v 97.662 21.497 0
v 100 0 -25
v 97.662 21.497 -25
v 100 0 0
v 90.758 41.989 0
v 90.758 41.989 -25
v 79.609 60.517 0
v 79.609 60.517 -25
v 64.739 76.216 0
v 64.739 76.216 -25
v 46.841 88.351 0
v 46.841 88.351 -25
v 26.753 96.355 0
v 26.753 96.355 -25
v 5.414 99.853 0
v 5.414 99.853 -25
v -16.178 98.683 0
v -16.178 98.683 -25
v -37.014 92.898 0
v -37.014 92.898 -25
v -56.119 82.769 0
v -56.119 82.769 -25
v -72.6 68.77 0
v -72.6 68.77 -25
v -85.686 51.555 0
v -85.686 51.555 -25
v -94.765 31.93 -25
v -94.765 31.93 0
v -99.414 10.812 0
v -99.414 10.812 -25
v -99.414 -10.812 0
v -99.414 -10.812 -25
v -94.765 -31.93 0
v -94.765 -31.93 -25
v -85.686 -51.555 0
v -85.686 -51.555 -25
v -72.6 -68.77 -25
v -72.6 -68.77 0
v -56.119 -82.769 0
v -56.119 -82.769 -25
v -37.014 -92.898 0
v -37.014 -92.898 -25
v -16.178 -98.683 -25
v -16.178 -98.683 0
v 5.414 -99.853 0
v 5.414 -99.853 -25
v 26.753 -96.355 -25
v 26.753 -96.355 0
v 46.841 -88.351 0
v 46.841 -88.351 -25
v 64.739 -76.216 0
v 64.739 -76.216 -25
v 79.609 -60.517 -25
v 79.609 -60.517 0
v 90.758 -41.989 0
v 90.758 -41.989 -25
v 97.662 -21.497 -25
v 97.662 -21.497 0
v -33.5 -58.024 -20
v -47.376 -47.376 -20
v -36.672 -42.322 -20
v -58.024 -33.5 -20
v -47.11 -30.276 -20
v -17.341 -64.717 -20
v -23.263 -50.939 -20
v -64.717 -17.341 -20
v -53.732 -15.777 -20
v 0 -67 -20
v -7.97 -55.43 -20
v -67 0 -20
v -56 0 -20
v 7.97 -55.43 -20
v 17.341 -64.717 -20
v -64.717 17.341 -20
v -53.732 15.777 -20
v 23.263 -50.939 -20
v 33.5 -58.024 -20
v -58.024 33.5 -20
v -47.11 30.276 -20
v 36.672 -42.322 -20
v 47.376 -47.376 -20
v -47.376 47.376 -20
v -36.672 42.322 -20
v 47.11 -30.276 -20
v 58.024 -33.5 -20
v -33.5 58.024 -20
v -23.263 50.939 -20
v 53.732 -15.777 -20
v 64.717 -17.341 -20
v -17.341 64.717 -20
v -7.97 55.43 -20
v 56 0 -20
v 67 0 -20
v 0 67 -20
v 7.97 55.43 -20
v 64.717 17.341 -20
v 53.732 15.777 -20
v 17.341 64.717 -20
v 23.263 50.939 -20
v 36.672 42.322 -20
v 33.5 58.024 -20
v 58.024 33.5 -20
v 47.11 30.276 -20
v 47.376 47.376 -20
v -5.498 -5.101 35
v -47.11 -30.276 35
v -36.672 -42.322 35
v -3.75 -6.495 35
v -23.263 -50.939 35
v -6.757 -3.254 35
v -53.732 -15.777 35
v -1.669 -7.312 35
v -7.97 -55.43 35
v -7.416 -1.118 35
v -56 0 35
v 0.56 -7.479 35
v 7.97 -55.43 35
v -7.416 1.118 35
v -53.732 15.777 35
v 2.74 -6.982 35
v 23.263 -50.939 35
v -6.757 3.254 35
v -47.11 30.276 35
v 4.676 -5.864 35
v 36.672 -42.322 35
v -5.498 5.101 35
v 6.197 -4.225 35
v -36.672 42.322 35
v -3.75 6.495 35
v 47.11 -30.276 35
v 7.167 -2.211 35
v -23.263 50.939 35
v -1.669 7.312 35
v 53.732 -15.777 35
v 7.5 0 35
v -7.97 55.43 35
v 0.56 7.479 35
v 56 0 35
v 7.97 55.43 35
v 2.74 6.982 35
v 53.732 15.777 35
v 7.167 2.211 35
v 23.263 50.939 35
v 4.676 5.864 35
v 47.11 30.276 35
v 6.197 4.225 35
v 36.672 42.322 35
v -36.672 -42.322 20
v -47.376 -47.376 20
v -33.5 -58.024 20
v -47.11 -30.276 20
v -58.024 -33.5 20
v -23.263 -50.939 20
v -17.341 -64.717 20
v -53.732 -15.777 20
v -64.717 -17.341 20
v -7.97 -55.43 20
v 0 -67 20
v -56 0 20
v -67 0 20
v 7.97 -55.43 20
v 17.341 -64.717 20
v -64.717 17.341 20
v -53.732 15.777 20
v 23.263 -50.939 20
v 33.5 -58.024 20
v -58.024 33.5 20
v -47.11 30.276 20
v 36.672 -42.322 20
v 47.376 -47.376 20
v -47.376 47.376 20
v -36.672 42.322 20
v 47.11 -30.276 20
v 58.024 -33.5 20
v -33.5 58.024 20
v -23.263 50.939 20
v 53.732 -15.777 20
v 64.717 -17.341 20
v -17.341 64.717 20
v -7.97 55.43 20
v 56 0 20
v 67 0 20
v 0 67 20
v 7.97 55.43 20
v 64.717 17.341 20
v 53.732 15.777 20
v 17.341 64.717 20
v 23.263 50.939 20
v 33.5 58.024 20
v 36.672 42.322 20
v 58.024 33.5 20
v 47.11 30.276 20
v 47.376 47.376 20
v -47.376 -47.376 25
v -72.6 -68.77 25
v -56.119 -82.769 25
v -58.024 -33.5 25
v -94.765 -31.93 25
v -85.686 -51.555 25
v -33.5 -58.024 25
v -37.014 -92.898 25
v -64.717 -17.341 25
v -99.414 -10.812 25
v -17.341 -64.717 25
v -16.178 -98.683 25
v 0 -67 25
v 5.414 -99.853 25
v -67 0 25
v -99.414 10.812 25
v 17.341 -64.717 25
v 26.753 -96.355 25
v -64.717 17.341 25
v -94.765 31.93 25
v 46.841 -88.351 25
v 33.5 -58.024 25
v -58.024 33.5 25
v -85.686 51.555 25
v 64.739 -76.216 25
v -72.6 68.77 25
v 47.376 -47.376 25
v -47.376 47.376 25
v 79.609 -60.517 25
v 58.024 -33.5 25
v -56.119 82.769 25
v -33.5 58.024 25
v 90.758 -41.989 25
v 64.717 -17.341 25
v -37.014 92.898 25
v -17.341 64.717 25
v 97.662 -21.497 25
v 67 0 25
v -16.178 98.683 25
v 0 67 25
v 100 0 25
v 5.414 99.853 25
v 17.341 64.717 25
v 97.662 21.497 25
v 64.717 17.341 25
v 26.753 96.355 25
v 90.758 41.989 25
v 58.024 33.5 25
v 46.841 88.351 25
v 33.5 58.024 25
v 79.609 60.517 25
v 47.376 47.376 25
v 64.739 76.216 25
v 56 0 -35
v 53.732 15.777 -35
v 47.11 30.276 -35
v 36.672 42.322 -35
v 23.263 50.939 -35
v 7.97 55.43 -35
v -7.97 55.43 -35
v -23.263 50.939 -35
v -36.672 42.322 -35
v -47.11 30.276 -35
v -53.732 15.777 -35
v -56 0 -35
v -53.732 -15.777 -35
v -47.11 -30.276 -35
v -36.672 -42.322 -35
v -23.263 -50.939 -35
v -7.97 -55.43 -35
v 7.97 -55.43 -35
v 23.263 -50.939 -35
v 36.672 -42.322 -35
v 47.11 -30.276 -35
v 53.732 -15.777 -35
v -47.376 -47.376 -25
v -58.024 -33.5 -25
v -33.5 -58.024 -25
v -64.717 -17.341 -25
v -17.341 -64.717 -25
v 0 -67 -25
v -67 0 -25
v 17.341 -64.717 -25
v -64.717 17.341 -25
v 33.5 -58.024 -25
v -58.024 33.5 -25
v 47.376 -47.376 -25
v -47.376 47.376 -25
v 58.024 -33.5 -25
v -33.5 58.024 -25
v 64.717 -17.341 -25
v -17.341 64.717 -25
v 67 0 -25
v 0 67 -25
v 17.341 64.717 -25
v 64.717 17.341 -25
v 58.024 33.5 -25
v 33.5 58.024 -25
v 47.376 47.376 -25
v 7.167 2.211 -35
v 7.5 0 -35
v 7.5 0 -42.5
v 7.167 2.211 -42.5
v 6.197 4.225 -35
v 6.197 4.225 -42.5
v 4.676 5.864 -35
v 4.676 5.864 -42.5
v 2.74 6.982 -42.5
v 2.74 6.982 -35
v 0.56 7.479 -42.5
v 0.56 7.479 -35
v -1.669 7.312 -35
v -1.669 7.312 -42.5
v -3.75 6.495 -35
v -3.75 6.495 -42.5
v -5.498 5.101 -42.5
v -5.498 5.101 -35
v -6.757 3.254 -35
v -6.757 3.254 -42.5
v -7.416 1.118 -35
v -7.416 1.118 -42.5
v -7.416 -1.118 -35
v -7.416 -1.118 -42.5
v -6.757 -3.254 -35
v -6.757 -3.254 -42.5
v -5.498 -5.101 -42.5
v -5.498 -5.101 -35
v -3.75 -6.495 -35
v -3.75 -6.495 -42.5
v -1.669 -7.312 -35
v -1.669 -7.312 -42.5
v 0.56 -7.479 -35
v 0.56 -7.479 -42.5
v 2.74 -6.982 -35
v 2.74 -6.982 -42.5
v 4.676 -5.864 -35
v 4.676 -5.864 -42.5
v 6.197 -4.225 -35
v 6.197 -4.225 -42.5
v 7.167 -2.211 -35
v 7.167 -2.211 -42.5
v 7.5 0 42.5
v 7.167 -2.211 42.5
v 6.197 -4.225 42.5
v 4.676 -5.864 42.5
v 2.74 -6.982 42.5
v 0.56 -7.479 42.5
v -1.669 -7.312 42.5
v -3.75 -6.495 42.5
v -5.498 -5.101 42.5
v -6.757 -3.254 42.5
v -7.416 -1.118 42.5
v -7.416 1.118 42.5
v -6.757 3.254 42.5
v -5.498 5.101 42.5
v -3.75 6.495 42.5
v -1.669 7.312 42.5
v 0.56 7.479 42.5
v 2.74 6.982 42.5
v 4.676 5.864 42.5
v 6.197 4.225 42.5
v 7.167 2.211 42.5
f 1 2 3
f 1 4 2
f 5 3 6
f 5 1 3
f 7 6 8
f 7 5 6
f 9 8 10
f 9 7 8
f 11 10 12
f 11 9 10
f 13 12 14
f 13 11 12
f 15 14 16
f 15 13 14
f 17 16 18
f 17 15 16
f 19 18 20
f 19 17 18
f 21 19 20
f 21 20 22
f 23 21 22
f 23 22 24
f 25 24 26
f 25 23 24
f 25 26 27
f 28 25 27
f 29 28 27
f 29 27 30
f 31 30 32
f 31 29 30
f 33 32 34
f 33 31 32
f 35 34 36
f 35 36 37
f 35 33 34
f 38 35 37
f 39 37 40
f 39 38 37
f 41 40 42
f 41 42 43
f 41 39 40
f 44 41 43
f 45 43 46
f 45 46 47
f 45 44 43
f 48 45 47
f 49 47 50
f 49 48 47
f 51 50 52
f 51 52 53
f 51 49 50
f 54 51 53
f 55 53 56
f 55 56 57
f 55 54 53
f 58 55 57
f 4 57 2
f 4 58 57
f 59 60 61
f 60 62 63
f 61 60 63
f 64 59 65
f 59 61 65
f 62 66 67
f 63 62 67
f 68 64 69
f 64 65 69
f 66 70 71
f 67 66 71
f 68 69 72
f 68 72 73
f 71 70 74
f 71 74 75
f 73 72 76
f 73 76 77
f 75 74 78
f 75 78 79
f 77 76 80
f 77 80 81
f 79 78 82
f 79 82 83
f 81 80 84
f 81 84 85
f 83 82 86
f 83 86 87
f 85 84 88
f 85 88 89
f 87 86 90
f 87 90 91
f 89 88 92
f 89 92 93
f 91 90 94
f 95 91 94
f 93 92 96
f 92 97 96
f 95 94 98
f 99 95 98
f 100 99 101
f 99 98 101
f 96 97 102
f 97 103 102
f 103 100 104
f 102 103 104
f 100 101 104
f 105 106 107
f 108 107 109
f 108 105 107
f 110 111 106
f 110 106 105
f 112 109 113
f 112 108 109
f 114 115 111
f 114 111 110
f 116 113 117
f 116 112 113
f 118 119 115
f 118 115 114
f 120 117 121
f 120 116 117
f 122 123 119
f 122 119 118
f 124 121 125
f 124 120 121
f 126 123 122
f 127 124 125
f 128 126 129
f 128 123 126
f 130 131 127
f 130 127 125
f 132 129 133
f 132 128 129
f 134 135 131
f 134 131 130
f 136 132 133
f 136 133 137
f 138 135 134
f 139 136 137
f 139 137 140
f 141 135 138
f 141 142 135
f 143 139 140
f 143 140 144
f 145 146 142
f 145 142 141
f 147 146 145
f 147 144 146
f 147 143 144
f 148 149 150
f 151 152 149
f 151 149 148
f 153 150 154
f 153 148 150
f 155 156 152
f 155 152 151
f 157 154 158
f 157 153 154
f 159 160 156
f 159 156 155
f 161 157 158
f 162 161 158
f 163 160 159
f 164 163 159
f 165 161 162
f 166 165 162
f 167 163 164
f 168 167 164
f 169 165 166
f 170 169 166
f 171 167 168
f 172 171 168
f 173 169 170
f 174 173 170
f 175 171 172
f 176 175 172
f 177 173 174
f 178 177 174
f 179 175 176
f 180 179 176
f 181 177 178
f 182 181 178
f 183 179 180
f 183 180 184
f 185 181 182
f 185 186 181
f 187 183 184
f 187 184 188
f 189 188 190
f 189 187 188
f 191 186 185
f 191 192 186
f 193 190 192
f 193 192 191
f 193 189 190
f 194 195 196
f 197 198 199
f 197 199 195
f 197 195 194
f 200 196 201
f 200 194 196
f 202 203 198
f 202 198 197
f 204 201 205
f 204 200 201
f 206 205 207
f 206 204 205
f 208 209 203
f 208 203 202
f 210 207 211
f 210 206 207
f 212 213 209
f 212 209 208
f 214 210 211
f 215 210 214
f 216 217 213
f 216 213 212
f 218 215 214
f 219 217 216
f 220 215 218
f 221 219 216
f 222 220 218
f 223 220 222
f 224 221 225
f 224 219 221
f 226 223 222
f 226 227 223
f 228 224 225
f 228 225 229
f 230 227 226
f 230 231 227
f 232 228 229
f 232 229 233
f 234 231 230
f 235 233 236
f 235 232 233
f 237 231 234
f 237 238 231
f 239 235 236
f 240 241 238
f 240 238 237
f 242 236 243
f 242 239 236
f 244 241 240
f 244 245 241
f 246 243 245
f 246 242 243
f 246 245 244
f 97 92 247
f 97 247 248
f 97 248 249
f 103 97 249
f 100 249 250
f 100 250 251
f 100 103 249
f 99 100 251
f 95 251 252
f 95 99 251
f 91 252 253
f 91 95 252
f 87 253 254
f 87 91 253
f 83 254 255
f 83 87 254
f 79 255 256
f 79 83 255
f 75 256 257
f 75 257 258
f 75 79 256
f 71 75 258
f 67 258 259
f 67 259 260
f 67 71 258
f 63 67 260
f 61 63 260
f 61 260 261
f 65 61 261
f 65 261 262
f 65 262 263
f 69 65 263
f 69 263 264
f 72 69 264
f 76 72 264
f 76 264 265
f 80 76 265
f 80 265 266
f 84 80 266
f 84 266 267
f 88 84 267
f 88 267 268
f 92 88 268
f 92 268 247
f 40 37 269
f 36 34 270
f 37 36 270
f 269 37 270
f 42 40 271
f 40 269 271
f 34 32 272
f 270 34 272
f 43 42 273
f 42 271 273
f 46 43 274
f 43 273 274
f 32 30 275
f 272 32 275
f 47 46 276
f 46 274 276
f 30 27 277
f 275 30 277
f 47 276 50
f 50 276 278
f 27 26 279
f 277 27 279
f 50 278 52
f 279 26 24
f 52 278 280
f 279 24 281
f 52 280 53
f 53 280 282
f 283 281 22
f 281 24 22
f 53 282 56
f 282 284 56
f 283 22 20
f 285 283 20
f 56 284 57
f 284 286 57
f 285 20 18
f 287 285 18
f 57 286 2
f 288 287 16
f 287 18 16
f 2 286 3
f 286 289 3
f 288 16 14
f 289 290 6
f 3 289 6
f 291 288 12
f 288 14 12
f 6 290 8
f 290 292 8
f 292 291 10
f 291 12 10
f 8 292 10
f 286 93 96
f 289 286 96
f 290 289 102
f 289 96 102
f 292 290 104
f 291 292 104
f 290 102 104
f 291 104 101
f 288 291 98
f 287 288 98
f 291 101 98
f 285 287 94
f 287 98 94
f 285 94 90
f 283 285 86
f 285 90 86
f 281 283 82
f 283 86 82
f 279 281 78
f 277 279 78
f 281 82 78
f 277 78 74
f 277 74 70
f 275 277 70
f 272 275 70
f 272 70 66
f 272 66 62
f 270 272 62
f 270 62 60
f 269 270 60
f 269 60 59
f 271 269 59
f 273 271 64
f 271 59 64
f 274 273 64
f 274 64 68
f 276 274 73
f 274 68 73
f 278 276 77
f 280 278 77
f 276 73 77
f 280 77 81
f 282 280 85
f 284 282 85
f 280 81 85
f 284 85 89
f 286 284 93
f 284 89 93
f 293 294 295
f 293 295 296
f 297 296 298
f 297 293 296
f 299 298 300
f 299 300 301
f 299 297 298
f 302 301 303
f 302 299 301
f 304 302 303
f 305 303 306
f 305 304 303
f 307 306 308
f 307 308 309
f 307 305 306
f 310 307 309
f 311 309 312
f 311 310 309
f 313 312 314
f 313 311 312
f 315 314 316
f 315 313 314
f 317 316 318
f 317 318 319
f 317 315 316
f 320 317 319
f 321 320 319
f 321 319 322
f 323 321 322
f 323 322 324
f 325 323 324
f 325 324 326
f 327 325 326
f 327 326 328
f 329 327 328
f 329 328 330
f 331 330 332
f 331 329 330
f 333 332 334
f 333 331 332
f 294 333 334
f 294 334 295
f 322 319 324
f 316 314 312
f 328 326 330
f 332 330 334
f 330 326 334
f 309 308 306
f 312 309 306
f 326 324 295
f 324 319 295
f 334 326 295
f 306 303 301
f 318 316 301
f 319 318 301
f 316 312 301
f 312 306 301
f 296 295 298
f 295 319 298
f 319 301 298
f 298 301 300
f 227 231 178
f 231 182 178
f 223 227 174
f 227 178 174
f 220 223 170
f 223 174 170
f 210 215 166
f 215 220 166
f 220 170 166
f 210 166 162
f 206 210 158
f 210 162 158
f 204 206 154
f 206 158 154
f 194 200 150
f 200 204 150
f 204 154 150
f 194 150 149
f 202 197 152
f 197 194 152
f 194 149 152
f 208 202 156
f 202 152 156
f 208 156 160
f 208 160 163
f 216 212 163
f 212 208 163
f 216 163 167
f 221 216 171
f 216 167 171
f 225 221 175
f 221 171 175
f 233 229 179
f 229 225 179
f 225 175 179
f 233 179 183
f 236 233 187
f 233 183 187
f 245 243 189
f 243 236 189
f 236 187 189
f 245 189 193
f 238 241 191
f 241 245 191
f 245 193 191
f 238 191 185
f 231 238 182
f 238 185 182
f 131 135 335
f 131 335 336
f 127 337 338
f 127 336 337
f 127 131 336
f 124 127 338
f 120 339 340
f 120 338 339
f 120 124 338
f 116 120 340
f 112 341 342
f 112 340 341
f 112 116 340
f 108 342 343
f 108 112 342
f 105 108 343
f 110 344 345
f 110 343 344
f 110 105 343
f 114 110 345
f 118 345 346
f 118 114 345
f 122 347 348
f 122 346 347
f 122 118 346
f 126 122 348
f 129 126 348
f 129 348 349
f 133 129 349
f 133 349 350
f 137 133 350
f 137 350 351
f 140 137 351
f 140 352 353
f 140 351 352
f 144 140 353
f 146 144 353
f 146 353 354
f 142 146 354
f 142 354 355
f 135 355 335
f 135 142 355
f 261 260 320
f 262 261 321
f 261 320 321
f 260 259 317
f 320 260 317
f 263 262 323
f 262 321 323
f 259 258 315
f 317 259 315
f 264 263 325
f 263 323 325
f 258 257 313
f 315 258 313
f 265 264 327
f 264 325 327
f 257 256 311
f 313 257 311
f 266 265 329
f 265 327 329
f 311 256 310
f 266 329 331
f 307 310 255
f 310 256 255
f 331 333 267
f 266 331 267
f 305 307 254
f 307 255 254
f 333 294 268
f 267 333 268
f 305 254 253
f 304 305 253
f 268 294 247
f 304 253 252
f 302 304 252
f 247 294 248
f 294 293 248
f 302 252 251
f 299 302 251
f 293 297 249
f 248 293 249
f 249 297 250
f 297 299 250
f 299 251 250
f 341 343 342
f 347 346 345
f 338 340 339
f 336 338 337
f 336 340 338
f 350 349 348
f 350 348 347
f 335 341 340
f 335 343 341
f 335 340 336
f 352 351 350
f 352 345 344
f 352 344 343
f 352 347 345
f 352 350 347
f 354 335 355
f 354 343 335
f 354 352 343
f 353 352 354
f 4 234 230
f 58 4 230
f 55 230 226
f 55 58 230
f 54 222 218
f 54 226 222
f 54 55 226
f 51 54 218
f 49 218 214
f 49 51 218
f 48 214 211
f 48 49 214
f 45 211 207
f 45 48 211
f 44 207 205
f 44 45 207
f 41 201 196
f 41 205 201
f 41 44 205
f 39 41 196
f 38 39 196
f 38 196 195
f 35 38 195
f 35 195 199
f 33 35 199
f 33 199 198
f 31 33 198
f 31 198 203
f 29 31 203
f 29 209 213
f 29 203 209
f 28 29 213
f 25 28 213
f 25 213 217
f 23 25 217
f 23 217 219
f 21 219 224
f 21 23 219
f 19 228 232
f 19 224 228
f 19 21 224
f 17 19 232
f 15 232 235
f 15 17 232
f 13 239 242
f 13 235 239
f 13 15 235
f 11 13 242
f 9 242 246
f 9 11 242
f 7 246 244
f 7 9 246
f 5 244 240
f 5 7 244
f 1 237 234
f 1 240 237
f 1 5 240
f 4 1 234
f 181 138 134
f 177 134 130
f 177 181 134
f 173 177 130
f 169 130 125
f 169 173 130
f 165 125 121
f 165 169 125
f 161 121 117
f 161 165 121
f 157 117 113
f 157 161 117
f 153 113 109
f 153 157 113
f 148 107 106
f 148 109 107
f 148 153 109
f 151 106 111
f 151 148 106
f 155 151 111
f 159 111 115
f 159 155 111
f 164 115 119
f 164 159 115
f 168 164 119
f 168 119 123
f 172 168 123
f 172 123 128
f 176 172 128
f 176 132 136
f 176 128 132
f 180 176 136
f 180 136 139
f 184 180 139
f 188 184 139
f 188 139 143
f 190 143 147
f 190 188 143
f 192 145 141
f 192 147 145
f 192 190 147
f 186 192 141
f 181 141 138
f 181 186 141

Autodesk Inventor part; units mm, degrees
ref_plane "YZ Plane" through (0, 0, 0) normal (1, 0, 0) x (0, 1, 0)
ref_plane "XZ Plane" through (0, 0, 0) normal (0, 1, 0) x (-1, 0, 0)
ref_plane "XY Plane" through (0, 0, 0) normal (0, 0, 1) x (1, 0, 0)
sketch "Sketch1" plane through (0, 0, 0) normal (0, 0, 1) x (1, 0, 0)
  circle A0 centre (0, 0) radius 100
  circle A1 centre (0, 0) radius 56
  circle A2 centre (0, 0) radius 67
  circle A3 centre (0, 0) radius 7.5
  dimension "d0" = 200
  dimension "d1" = 112
  dimension "d2" = 11
  dimension "d3" = 15
extrude "Extrusion1" add sketch "Sketch1" along normal mid plane 50 contours A0
extrude "Extrusion2" add sketch "Sketch1" along normal mid plane 85 contours A3
extrude "Extrusion3" add sketch "Sketch1" along normal mid plane 70 contours A1
extrude "Extrusion4" add sketch "Sketch1" along normal mid plane 40 contours A2
properties part number "motor at24v"
